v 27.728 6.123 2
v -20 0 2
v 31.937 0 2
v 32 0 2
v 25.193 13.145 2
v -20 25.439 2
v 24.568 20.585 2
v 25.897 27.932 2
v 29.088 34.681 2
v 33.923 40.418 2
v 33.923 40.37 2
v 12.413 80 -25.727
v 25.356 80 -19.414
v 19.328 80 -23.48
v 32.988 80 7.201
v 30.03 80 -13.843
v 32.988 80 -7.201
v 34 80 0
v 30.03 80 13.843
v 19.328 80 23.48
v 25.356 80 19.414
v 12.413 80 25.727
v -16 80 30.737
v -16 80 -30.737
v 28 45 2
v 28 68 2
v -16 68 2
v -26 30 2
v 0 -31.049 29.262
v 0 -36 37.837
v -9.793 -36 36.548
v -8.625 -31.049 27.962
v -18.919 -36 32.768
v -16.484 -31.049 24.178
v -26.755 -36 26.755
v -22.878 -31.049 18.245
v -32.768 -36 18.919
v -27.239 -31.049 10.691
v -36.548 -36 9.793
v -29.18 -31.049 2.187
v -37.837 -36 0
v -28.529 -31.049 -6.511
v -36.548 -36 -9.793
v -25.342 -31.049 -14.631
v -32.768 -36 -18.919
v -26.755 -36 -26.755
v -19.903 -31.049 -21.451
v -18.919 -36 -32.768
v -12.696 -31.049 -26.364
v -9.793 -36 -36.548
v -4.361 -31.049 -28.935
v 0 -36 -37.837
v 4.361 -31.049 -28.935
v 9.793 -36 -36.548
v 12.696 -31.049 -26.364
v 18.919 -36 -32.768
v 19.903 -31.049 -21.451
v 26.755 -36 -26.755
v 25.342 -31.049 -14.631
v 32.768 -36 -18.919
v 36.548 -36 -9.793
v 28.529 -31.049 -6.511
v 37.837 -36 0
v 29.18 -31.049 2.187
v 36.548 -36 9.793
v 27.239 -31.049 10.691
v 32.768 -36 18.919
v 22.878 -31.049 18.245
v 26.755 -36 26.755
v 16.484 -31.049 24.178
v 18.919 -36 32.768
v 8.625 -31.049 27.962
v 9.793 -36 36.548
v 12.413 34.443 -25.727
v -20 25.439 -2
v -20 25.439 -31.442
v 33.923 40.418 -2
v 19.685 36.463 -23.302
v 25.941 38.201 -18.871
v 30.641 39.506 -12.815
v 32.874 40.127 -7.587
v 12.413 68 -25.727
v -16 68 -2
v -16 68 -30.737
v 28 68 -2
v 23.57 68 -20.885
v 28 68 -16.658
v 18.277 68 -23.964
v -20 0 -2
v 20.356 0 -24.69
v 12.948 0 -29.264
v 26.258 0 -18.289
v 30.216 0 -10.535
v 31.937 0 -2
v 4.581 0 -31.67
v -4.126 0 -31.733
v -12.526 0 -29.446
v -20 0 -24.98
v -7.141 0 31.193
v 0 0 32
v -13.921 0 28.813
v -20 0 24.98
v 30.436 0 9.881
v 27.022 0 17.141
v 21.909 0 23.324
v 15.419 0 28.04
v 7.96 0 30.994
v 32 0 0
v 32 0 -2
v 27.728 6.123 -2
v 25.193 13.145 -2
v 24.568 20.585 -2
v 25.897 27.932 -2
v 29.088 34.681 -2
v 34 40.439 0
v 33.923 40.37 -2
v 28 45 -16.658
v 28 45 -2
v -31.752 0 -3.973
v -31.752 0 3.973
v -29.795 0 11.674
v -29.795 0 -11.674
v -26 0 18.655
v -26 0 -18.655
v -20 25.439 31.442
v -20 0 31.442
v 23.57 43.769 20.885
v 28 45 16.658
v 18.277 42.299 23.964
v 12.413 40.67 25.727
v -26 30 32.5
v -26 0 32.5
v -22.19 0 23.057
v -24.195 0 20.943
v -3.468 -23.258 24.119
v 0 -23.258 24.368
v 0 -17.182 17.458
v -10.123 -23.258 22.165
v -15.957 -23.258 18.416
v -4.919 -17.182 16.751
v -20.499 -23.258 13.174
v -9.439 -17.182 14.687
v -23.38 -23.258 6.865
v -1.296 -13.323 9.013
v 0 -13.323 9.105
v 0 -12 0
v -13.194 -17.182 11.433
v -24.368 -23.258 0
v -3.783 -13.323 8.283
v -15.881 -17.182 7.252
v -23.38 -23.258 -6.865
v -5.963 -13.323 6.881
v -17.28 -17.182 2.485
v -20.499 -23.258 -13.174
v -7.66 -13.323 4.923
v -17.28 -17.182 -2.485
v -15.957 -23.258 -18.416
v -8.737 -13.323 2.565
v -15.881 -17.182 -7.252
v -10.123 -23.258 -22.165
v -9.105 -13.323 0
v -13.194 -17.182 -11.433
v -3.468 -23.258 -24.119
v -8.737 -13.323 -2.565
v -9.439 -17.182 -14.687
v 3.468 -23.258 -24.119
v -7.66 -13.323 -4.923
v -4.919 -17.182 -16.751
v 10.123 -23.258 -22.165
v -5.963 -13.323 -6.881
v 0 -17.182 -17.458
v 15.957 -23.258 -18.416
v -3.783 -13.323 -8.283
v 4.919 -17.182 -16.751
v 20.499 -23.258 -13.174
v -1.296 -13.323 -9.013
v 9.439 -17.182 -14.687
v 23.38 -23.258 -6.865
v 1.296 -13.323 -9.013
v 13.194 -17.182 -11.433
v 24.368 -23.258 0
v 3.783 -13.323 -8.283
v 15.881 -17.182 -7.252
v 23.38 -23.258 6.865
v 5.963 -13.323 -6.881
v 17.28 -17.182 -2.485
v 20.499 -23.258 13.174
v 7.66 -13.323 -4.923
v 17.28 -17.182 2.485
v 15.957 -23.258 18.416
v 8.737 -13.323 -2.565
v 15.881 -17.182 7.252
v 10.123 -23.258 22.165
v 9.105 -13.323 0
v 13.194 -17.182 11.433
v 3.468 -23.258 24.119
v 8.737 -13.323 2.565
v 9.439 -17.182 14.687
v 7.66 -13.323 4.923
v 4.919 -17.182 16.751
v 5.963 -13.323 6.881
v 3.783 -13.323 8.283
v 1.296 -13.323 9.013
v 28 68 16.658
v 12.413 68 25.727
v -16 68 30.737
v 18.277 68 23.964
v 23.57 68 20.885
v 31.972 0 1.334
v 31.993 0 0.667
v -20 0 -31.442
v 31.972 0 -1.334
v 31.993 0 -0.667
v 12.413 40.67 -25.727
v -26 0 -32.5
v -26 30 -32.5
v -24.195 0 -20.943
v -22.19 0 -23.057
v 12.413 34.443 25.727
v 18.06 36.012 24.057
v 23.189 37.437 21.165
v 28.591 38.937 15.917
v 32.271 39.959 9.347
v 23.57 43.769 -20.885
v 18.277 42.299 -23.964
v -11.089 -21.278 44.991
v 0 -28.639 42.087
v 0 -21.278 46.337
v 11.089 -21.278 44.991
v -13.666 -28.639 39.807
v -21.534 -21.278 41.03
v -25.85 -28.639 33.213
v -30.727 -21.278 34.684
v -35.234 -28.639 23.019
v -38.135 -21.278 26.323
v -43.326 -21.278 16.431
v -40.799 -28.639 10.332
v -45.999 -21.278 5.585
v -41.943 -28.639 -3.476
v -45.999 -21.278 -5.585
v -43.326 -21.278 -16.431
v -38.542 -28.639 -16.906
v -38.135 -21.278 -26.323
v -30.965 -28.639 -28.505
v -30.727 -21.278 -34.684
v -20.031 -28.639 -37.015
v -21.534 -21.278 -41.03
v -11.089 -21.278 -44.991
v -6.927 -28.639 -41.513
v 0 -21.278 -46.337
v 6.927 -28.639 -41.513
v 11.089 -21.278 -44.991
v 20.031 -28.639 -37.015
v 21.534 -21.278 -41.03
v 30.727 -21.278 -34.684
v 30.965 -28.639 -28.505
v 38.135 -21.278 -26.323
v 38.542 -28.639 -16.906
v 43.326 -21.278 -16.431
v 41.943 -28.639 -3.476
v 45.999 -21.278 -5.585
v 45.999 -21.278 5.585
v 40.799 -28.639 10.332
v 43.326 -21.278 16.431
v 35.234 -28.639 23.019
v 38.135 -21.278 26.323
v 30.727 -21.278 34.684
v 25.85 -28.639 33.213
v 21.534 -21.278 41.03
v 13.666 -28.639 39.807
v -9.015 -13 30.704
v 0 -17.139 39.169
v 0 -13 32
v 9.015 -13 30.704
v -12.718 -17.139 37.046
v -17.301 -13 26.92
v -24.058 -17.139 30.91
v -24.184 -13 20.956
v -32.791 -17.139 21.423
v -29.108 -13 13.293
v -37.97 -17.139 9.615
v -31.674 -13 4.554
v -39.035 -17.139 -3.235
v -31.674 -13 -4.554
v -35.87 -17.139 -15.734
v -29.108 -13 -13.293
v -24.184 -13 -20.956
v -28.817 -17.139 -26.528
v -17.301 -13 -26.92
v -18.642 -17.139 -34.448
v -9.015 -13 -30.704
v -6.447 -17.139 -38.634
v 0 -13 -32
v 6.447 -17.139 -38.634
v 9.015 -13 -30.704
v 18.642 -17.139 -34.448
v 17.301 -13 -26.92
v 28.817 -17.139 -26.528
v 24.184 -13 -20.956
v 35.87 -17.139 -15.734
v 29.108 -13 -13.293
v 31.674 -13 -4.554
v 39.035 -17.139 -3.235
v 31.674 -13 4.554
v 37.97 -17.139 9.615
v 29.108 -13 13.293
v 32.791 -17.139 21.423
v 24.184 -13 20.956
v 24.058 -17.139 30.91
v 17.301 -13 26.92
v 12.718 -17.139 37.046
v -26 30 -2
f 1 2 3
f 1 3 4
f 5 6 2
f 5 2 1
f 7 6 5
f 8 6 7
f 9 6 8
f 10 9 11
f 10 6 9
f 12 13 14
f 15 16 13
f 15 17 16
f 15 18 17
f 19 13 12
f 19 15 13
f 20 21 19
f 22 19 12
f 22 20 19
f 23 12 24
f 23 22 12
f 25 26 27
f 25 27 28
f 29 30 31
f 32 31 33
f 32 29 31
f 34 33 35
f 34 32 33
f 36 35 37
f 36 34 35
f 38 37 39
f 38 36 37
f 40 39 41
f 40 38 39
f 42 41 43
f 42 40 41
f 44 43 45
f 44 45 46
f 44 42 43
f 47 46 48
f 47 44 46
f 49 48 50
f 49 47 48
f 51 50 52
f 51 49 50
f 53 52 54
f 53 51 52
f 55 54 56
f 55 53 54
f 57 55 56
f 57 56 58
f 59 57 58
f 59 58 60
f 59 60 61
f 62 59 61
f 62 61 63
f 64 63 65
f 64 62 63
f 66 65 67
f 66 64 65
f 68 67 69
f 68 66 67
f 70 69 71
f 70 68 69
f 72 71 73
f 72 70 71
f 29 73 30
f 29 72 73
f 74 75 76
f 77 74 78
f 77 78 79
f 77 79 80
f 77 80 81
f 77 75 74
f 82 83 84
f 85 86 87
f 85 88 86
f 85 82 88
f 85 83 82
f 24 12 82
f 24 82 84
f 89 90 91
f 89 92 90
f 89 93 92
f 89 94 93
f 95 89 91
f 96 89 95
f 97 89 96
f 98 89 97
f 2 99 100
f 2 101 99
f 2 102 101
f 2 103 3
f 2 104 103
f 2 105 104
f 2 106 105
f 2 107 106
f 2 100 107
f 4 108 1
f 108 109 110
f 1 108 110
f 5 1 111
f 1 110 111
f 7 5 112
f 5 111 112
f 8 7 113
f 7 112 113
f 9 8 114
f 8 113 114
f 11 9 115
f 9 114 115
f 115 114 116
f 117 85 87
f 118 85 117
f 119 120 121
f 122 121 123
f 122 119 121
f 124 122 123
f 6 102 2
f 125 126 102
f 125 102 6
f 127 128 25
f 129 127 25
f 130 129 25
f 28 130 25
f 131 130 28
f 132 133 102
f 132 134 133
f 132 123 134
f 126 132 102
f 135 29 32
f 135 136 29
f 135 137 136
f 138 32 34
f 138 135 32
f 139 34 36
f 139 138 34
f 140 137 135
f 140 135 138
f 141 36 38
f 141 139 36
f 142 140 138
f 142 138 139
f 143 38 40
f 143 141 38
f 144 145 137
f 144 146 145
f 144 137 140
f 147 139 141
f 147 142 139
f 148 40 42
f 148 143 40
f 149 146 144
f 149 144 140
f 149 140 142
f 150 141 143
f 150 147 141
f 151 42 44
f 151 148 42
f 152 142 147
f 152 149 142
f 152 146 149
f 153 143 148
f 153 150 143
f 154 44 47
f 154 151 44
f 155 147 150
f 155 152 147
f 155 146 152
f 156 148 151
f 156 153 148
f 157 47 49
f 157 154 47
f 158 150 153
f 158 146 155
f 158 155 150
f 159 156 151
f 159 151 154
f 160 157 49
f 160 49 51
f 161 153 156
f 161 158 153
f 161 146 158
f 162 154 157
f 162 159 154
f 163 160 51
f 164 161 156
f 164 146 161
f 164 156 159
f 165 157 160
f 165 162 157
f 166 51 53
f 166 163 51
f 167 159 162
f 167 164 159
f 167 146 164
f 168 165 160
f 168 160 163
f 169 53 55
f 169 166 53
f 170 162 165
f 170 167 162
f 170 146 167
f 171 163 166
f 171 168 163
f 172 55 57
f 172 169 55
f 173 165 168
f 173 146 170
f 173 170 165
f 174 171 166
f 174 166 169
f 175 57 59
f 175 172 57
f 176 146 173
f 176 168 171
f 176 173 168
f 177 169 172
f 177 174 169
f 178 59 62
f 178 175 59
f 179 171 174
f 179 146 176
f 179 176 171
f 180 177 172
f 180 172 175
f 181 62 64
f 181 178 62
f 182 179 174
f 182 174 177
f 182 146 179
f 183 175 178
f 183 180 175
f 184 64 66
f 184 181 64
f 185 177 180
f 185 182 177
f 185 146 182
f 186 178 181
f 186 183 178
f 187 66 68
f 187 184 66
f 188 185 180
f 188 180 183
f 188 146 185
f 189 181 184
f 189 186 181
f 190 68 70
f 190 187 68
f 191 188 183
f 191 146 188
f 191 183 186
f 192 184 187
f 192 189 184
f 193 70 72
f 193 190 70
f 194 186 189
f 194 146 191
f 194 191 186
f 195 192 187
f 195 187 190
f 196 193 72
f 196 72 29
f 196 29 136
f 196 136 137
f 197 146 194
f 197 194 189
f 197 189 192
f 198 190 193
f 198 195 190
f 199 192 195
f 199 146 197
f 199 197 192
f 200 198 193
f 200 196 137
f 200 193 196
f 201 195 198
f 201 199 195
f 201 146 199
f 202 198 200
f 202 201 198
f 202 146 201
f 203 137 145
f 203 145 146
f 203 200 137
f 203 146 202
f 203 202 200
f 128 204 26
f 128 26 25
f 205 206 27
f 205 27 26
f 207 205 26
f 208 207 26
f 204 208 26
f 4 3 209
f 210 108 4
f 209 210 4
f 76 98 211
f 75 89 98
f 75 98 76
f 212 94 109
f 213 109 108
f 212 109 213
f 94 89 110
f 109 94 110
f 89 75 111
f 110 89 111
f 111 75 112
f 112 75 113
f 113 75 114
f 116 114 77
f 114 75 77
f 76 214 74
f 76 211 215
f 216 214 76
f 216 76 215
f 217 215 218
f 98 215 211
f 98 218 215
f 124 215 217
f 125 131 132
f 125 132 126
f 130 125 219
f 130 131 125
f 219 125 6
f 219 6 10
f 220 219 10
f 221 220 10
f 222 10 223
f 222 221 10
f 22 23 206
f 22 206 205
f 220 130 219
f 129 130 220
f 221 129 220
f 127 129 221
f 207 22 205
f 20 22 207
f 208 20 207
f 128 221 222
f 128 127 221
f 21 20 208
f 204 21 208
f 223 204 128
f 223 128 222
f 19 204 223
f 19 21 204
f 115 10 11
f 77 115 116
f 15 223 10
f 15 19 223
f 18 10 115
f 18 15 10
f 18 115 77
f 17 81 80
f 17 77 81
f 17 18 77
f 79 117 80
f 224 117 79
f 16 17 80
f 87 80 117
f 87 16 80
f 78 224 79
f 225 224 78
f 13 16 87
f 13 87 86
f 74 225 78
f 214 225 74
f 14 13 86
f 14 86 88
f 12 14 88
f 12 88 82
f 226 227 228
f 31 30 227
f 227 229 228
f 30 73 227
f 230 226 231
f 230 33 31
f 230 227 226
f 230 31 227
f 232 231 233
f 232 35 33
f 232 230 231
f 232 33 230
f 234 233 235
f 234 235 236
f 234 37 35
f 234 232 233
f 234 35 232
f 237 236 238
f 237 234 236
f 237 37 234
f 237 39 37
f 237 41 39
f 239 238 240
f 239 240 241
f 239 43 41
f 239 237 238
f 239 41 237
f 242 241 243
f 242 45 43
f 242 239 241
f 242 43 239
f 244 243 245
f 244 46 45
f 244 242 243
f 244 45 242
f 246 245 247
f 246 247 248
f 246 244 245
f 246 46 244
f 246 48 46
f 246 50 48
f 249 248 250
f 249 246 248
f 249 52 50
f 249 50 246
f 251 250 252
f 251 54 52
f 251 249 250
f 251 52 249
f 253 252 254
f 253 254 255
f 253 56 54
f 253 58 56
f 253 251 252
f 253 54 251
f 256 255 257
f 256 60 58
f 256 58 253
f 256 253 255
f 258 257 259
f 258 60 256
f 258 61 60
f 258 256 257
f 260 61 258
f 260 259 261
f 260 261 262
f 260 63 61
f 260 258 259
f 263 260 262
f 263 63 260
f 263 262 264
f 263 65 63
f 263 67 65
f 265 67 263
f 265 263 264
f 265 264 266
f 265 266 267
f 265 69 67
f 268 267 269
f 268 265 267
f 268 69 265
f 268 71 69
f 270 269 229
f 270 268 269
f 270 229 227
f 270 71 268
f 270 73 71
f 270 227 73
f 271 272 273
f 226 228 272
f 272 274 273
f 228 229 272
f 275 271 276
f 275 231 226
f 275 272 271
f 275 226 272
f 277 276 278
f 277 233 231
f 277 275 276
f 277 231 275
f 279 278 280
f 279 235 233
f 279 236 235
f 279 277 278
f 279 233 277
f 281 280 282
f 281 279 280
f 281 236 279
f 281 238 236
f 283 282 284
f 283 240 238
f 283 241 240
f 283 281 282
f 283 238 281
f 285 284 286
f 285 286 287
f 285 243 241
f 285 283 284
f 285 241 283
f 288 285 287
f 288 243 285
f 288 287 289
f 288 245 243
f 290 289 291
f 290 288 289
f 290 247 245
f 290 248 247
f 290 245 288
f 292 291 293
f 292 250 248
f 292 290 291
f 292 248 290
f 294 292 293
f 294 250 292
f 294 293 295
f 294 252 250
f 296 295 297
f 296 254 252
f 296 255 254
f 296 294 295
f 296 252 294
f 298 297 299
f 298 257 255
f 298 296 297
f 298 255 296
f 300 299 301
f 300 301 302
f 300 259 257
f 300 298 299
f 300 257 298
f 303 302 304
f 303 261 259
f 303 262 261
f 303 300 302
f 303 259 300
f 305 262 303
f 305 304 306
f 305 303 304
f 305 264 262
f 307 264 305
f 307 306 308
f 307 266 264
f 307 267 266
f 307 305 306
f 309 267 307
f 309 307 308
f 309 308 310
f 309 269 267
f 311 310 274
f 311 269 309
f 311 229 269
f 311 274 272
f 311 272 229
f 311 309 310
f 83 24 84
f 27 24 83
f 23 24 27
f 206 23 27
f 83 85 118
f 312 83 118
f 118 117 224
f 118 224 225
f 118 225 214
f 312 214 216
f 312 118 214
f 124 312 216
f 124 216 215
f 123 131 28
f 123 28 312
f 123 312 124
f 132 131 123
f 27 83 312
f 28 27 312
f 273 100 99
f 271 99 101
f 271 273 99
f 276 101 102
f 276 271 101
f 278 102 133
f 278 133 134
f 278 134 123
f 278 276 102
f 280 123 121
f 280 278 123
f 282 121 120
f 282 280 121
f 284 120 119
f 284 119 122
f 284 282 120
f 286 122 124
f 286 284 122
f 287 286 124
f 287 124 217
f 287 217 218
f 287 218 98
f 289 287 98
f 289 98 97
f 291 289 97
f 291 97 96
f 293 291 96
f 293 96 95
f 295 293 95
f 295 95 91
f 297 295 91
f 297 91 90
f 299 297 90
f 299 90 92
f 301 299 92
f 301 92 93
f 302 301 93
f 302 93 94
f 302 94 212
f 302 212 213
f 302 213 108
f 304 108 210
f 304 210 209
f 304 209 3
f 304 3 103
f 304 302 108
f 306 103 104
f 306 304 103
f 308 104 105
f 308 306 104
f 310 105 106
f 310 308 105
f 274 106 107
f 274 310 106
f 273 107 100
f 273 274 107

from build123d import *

# Parameters (mm, degrees)
BOSS_EXTRUDE1_DEPTH = 40
RIB7_START          = -2
RIB7_DEPTH          = 4
SKETCH2_OUTSIDE_W   = 129.678
SKETCH2_OUTSIDE_H   = 129.678
CUT_EXTRUDE1_DEPTH  = 80
RIB1_REACH          = 105.413
SKETCH3_WALL_W      = 248.119937824
SKETCH3_WALL_H      = 4


# Read off the part's stored shape, not the designer's step: Rib7
with BuildPart() as part:
    # Sketch1 → Revolve1 (revolve)
    with BuildSketch(Plane.XY, mode=Mode.PRIVATE) as revolve1_sk:
        with BuildLine():
            Line((-37.837168574, -36), (-29.262233414, -31.049258877))
            ThreePointArc((-29.262233414, -31.049258877), (-17.458182667, -17.181874451), (0, -12))
            Line((0, -12), (0, 0))
            Line((0, 0), (-32, 0))
            Line((-32, 0), (-32, -13))
            Line((-32, -13), (-46.337168574, -21.277568136))
            Line((-46.337168574, -21.277568136), (-37.837168574, -36))
        make_face()
    revolve(revolve1_sk.sketch.rotate(Axis((0, 0, 0), (0, -1, 0)), 270), axis=Axis((0, 0, 0), (0, -1, 0)))

    # Sketch1<3> → Boss-Extrude1 (add, symmetric)
    with BuildSketch(Plane.XY):
        Polygon((-26, 0), (-20, 0), (-20, 25.439486103), (34, 40.439486103), (34, 80), (-16, 80), (-16, 68), (28, 68), (28, 45), (-26, 30), align=None)
    extrude(amount=BOSS_EXTRUDE1_DEPTH, both=True)

    # Rib7 outline → Rib7 (add)
    with BuildSketch(Plane.XY.offset(RIB7_START)):
        with BuildLine():
            Line((-20, 0), (32, 0))
            ThreePointArc((32, 0), (24.570511929, 20.636636978), (34, 40.439486103))
            Line((34, 40.439486103), (-20, 25.439486103))
            Line((-20, 25.439486103), (-20, 0))
        make_face()
    extrude(amount=RIB7_DEPTH)

    # Sketch2 outside → Cut-Extrude1 (cut)
    with BuildSketch(Plane(origin=(0, 80, 0), x_dir=(1, 0, 0), z_dir=(0, 1, 0))):
        Rectangle(SKETCH2_OUTSIDE_W, SKETCH2_OUTSIDE_H)
        with BuildLine():
            Line((12.412638687, 25.726815399), (-26, 32.5))
            Line((-26, 32.5), (-26, -32.5))
            Line((-26, -32.5), (12.412638687, -25.726815399))
            ThreePointArc((12.412638687, -25.726815399), (34, 0), (12.412638687, 25.726815399))
        make_face(mode=Mode.SUBTRACT)
    extrude(amount=-CUT_EXTRUDE1_DEPTH, mode=Mode.SUBTRACT)

    # Sketch3 wall → Rib1 (add, up to next)
    with BuildSketch(Plane(origin=(-21, 49, 0), x_dir=(-0.25449329928, -0.967074537263, 0), z_dir=(0.967074537263, -0.25449329928, 0)), mode=Mode.PRIVATE) as rib1_sk1:
        Rectangle(SKETCH3_WALL_W, SKETCH3_WALL_H)
    rib1_tool1 = extrude(rib1_sk1.sketch, amount=RIB1_REACH, mode=Mode.PRIVATE) - part.part
    add(rib1_tool1.solids().sort_by_distance((-21, 49, 0))[0])


solid = part.part
